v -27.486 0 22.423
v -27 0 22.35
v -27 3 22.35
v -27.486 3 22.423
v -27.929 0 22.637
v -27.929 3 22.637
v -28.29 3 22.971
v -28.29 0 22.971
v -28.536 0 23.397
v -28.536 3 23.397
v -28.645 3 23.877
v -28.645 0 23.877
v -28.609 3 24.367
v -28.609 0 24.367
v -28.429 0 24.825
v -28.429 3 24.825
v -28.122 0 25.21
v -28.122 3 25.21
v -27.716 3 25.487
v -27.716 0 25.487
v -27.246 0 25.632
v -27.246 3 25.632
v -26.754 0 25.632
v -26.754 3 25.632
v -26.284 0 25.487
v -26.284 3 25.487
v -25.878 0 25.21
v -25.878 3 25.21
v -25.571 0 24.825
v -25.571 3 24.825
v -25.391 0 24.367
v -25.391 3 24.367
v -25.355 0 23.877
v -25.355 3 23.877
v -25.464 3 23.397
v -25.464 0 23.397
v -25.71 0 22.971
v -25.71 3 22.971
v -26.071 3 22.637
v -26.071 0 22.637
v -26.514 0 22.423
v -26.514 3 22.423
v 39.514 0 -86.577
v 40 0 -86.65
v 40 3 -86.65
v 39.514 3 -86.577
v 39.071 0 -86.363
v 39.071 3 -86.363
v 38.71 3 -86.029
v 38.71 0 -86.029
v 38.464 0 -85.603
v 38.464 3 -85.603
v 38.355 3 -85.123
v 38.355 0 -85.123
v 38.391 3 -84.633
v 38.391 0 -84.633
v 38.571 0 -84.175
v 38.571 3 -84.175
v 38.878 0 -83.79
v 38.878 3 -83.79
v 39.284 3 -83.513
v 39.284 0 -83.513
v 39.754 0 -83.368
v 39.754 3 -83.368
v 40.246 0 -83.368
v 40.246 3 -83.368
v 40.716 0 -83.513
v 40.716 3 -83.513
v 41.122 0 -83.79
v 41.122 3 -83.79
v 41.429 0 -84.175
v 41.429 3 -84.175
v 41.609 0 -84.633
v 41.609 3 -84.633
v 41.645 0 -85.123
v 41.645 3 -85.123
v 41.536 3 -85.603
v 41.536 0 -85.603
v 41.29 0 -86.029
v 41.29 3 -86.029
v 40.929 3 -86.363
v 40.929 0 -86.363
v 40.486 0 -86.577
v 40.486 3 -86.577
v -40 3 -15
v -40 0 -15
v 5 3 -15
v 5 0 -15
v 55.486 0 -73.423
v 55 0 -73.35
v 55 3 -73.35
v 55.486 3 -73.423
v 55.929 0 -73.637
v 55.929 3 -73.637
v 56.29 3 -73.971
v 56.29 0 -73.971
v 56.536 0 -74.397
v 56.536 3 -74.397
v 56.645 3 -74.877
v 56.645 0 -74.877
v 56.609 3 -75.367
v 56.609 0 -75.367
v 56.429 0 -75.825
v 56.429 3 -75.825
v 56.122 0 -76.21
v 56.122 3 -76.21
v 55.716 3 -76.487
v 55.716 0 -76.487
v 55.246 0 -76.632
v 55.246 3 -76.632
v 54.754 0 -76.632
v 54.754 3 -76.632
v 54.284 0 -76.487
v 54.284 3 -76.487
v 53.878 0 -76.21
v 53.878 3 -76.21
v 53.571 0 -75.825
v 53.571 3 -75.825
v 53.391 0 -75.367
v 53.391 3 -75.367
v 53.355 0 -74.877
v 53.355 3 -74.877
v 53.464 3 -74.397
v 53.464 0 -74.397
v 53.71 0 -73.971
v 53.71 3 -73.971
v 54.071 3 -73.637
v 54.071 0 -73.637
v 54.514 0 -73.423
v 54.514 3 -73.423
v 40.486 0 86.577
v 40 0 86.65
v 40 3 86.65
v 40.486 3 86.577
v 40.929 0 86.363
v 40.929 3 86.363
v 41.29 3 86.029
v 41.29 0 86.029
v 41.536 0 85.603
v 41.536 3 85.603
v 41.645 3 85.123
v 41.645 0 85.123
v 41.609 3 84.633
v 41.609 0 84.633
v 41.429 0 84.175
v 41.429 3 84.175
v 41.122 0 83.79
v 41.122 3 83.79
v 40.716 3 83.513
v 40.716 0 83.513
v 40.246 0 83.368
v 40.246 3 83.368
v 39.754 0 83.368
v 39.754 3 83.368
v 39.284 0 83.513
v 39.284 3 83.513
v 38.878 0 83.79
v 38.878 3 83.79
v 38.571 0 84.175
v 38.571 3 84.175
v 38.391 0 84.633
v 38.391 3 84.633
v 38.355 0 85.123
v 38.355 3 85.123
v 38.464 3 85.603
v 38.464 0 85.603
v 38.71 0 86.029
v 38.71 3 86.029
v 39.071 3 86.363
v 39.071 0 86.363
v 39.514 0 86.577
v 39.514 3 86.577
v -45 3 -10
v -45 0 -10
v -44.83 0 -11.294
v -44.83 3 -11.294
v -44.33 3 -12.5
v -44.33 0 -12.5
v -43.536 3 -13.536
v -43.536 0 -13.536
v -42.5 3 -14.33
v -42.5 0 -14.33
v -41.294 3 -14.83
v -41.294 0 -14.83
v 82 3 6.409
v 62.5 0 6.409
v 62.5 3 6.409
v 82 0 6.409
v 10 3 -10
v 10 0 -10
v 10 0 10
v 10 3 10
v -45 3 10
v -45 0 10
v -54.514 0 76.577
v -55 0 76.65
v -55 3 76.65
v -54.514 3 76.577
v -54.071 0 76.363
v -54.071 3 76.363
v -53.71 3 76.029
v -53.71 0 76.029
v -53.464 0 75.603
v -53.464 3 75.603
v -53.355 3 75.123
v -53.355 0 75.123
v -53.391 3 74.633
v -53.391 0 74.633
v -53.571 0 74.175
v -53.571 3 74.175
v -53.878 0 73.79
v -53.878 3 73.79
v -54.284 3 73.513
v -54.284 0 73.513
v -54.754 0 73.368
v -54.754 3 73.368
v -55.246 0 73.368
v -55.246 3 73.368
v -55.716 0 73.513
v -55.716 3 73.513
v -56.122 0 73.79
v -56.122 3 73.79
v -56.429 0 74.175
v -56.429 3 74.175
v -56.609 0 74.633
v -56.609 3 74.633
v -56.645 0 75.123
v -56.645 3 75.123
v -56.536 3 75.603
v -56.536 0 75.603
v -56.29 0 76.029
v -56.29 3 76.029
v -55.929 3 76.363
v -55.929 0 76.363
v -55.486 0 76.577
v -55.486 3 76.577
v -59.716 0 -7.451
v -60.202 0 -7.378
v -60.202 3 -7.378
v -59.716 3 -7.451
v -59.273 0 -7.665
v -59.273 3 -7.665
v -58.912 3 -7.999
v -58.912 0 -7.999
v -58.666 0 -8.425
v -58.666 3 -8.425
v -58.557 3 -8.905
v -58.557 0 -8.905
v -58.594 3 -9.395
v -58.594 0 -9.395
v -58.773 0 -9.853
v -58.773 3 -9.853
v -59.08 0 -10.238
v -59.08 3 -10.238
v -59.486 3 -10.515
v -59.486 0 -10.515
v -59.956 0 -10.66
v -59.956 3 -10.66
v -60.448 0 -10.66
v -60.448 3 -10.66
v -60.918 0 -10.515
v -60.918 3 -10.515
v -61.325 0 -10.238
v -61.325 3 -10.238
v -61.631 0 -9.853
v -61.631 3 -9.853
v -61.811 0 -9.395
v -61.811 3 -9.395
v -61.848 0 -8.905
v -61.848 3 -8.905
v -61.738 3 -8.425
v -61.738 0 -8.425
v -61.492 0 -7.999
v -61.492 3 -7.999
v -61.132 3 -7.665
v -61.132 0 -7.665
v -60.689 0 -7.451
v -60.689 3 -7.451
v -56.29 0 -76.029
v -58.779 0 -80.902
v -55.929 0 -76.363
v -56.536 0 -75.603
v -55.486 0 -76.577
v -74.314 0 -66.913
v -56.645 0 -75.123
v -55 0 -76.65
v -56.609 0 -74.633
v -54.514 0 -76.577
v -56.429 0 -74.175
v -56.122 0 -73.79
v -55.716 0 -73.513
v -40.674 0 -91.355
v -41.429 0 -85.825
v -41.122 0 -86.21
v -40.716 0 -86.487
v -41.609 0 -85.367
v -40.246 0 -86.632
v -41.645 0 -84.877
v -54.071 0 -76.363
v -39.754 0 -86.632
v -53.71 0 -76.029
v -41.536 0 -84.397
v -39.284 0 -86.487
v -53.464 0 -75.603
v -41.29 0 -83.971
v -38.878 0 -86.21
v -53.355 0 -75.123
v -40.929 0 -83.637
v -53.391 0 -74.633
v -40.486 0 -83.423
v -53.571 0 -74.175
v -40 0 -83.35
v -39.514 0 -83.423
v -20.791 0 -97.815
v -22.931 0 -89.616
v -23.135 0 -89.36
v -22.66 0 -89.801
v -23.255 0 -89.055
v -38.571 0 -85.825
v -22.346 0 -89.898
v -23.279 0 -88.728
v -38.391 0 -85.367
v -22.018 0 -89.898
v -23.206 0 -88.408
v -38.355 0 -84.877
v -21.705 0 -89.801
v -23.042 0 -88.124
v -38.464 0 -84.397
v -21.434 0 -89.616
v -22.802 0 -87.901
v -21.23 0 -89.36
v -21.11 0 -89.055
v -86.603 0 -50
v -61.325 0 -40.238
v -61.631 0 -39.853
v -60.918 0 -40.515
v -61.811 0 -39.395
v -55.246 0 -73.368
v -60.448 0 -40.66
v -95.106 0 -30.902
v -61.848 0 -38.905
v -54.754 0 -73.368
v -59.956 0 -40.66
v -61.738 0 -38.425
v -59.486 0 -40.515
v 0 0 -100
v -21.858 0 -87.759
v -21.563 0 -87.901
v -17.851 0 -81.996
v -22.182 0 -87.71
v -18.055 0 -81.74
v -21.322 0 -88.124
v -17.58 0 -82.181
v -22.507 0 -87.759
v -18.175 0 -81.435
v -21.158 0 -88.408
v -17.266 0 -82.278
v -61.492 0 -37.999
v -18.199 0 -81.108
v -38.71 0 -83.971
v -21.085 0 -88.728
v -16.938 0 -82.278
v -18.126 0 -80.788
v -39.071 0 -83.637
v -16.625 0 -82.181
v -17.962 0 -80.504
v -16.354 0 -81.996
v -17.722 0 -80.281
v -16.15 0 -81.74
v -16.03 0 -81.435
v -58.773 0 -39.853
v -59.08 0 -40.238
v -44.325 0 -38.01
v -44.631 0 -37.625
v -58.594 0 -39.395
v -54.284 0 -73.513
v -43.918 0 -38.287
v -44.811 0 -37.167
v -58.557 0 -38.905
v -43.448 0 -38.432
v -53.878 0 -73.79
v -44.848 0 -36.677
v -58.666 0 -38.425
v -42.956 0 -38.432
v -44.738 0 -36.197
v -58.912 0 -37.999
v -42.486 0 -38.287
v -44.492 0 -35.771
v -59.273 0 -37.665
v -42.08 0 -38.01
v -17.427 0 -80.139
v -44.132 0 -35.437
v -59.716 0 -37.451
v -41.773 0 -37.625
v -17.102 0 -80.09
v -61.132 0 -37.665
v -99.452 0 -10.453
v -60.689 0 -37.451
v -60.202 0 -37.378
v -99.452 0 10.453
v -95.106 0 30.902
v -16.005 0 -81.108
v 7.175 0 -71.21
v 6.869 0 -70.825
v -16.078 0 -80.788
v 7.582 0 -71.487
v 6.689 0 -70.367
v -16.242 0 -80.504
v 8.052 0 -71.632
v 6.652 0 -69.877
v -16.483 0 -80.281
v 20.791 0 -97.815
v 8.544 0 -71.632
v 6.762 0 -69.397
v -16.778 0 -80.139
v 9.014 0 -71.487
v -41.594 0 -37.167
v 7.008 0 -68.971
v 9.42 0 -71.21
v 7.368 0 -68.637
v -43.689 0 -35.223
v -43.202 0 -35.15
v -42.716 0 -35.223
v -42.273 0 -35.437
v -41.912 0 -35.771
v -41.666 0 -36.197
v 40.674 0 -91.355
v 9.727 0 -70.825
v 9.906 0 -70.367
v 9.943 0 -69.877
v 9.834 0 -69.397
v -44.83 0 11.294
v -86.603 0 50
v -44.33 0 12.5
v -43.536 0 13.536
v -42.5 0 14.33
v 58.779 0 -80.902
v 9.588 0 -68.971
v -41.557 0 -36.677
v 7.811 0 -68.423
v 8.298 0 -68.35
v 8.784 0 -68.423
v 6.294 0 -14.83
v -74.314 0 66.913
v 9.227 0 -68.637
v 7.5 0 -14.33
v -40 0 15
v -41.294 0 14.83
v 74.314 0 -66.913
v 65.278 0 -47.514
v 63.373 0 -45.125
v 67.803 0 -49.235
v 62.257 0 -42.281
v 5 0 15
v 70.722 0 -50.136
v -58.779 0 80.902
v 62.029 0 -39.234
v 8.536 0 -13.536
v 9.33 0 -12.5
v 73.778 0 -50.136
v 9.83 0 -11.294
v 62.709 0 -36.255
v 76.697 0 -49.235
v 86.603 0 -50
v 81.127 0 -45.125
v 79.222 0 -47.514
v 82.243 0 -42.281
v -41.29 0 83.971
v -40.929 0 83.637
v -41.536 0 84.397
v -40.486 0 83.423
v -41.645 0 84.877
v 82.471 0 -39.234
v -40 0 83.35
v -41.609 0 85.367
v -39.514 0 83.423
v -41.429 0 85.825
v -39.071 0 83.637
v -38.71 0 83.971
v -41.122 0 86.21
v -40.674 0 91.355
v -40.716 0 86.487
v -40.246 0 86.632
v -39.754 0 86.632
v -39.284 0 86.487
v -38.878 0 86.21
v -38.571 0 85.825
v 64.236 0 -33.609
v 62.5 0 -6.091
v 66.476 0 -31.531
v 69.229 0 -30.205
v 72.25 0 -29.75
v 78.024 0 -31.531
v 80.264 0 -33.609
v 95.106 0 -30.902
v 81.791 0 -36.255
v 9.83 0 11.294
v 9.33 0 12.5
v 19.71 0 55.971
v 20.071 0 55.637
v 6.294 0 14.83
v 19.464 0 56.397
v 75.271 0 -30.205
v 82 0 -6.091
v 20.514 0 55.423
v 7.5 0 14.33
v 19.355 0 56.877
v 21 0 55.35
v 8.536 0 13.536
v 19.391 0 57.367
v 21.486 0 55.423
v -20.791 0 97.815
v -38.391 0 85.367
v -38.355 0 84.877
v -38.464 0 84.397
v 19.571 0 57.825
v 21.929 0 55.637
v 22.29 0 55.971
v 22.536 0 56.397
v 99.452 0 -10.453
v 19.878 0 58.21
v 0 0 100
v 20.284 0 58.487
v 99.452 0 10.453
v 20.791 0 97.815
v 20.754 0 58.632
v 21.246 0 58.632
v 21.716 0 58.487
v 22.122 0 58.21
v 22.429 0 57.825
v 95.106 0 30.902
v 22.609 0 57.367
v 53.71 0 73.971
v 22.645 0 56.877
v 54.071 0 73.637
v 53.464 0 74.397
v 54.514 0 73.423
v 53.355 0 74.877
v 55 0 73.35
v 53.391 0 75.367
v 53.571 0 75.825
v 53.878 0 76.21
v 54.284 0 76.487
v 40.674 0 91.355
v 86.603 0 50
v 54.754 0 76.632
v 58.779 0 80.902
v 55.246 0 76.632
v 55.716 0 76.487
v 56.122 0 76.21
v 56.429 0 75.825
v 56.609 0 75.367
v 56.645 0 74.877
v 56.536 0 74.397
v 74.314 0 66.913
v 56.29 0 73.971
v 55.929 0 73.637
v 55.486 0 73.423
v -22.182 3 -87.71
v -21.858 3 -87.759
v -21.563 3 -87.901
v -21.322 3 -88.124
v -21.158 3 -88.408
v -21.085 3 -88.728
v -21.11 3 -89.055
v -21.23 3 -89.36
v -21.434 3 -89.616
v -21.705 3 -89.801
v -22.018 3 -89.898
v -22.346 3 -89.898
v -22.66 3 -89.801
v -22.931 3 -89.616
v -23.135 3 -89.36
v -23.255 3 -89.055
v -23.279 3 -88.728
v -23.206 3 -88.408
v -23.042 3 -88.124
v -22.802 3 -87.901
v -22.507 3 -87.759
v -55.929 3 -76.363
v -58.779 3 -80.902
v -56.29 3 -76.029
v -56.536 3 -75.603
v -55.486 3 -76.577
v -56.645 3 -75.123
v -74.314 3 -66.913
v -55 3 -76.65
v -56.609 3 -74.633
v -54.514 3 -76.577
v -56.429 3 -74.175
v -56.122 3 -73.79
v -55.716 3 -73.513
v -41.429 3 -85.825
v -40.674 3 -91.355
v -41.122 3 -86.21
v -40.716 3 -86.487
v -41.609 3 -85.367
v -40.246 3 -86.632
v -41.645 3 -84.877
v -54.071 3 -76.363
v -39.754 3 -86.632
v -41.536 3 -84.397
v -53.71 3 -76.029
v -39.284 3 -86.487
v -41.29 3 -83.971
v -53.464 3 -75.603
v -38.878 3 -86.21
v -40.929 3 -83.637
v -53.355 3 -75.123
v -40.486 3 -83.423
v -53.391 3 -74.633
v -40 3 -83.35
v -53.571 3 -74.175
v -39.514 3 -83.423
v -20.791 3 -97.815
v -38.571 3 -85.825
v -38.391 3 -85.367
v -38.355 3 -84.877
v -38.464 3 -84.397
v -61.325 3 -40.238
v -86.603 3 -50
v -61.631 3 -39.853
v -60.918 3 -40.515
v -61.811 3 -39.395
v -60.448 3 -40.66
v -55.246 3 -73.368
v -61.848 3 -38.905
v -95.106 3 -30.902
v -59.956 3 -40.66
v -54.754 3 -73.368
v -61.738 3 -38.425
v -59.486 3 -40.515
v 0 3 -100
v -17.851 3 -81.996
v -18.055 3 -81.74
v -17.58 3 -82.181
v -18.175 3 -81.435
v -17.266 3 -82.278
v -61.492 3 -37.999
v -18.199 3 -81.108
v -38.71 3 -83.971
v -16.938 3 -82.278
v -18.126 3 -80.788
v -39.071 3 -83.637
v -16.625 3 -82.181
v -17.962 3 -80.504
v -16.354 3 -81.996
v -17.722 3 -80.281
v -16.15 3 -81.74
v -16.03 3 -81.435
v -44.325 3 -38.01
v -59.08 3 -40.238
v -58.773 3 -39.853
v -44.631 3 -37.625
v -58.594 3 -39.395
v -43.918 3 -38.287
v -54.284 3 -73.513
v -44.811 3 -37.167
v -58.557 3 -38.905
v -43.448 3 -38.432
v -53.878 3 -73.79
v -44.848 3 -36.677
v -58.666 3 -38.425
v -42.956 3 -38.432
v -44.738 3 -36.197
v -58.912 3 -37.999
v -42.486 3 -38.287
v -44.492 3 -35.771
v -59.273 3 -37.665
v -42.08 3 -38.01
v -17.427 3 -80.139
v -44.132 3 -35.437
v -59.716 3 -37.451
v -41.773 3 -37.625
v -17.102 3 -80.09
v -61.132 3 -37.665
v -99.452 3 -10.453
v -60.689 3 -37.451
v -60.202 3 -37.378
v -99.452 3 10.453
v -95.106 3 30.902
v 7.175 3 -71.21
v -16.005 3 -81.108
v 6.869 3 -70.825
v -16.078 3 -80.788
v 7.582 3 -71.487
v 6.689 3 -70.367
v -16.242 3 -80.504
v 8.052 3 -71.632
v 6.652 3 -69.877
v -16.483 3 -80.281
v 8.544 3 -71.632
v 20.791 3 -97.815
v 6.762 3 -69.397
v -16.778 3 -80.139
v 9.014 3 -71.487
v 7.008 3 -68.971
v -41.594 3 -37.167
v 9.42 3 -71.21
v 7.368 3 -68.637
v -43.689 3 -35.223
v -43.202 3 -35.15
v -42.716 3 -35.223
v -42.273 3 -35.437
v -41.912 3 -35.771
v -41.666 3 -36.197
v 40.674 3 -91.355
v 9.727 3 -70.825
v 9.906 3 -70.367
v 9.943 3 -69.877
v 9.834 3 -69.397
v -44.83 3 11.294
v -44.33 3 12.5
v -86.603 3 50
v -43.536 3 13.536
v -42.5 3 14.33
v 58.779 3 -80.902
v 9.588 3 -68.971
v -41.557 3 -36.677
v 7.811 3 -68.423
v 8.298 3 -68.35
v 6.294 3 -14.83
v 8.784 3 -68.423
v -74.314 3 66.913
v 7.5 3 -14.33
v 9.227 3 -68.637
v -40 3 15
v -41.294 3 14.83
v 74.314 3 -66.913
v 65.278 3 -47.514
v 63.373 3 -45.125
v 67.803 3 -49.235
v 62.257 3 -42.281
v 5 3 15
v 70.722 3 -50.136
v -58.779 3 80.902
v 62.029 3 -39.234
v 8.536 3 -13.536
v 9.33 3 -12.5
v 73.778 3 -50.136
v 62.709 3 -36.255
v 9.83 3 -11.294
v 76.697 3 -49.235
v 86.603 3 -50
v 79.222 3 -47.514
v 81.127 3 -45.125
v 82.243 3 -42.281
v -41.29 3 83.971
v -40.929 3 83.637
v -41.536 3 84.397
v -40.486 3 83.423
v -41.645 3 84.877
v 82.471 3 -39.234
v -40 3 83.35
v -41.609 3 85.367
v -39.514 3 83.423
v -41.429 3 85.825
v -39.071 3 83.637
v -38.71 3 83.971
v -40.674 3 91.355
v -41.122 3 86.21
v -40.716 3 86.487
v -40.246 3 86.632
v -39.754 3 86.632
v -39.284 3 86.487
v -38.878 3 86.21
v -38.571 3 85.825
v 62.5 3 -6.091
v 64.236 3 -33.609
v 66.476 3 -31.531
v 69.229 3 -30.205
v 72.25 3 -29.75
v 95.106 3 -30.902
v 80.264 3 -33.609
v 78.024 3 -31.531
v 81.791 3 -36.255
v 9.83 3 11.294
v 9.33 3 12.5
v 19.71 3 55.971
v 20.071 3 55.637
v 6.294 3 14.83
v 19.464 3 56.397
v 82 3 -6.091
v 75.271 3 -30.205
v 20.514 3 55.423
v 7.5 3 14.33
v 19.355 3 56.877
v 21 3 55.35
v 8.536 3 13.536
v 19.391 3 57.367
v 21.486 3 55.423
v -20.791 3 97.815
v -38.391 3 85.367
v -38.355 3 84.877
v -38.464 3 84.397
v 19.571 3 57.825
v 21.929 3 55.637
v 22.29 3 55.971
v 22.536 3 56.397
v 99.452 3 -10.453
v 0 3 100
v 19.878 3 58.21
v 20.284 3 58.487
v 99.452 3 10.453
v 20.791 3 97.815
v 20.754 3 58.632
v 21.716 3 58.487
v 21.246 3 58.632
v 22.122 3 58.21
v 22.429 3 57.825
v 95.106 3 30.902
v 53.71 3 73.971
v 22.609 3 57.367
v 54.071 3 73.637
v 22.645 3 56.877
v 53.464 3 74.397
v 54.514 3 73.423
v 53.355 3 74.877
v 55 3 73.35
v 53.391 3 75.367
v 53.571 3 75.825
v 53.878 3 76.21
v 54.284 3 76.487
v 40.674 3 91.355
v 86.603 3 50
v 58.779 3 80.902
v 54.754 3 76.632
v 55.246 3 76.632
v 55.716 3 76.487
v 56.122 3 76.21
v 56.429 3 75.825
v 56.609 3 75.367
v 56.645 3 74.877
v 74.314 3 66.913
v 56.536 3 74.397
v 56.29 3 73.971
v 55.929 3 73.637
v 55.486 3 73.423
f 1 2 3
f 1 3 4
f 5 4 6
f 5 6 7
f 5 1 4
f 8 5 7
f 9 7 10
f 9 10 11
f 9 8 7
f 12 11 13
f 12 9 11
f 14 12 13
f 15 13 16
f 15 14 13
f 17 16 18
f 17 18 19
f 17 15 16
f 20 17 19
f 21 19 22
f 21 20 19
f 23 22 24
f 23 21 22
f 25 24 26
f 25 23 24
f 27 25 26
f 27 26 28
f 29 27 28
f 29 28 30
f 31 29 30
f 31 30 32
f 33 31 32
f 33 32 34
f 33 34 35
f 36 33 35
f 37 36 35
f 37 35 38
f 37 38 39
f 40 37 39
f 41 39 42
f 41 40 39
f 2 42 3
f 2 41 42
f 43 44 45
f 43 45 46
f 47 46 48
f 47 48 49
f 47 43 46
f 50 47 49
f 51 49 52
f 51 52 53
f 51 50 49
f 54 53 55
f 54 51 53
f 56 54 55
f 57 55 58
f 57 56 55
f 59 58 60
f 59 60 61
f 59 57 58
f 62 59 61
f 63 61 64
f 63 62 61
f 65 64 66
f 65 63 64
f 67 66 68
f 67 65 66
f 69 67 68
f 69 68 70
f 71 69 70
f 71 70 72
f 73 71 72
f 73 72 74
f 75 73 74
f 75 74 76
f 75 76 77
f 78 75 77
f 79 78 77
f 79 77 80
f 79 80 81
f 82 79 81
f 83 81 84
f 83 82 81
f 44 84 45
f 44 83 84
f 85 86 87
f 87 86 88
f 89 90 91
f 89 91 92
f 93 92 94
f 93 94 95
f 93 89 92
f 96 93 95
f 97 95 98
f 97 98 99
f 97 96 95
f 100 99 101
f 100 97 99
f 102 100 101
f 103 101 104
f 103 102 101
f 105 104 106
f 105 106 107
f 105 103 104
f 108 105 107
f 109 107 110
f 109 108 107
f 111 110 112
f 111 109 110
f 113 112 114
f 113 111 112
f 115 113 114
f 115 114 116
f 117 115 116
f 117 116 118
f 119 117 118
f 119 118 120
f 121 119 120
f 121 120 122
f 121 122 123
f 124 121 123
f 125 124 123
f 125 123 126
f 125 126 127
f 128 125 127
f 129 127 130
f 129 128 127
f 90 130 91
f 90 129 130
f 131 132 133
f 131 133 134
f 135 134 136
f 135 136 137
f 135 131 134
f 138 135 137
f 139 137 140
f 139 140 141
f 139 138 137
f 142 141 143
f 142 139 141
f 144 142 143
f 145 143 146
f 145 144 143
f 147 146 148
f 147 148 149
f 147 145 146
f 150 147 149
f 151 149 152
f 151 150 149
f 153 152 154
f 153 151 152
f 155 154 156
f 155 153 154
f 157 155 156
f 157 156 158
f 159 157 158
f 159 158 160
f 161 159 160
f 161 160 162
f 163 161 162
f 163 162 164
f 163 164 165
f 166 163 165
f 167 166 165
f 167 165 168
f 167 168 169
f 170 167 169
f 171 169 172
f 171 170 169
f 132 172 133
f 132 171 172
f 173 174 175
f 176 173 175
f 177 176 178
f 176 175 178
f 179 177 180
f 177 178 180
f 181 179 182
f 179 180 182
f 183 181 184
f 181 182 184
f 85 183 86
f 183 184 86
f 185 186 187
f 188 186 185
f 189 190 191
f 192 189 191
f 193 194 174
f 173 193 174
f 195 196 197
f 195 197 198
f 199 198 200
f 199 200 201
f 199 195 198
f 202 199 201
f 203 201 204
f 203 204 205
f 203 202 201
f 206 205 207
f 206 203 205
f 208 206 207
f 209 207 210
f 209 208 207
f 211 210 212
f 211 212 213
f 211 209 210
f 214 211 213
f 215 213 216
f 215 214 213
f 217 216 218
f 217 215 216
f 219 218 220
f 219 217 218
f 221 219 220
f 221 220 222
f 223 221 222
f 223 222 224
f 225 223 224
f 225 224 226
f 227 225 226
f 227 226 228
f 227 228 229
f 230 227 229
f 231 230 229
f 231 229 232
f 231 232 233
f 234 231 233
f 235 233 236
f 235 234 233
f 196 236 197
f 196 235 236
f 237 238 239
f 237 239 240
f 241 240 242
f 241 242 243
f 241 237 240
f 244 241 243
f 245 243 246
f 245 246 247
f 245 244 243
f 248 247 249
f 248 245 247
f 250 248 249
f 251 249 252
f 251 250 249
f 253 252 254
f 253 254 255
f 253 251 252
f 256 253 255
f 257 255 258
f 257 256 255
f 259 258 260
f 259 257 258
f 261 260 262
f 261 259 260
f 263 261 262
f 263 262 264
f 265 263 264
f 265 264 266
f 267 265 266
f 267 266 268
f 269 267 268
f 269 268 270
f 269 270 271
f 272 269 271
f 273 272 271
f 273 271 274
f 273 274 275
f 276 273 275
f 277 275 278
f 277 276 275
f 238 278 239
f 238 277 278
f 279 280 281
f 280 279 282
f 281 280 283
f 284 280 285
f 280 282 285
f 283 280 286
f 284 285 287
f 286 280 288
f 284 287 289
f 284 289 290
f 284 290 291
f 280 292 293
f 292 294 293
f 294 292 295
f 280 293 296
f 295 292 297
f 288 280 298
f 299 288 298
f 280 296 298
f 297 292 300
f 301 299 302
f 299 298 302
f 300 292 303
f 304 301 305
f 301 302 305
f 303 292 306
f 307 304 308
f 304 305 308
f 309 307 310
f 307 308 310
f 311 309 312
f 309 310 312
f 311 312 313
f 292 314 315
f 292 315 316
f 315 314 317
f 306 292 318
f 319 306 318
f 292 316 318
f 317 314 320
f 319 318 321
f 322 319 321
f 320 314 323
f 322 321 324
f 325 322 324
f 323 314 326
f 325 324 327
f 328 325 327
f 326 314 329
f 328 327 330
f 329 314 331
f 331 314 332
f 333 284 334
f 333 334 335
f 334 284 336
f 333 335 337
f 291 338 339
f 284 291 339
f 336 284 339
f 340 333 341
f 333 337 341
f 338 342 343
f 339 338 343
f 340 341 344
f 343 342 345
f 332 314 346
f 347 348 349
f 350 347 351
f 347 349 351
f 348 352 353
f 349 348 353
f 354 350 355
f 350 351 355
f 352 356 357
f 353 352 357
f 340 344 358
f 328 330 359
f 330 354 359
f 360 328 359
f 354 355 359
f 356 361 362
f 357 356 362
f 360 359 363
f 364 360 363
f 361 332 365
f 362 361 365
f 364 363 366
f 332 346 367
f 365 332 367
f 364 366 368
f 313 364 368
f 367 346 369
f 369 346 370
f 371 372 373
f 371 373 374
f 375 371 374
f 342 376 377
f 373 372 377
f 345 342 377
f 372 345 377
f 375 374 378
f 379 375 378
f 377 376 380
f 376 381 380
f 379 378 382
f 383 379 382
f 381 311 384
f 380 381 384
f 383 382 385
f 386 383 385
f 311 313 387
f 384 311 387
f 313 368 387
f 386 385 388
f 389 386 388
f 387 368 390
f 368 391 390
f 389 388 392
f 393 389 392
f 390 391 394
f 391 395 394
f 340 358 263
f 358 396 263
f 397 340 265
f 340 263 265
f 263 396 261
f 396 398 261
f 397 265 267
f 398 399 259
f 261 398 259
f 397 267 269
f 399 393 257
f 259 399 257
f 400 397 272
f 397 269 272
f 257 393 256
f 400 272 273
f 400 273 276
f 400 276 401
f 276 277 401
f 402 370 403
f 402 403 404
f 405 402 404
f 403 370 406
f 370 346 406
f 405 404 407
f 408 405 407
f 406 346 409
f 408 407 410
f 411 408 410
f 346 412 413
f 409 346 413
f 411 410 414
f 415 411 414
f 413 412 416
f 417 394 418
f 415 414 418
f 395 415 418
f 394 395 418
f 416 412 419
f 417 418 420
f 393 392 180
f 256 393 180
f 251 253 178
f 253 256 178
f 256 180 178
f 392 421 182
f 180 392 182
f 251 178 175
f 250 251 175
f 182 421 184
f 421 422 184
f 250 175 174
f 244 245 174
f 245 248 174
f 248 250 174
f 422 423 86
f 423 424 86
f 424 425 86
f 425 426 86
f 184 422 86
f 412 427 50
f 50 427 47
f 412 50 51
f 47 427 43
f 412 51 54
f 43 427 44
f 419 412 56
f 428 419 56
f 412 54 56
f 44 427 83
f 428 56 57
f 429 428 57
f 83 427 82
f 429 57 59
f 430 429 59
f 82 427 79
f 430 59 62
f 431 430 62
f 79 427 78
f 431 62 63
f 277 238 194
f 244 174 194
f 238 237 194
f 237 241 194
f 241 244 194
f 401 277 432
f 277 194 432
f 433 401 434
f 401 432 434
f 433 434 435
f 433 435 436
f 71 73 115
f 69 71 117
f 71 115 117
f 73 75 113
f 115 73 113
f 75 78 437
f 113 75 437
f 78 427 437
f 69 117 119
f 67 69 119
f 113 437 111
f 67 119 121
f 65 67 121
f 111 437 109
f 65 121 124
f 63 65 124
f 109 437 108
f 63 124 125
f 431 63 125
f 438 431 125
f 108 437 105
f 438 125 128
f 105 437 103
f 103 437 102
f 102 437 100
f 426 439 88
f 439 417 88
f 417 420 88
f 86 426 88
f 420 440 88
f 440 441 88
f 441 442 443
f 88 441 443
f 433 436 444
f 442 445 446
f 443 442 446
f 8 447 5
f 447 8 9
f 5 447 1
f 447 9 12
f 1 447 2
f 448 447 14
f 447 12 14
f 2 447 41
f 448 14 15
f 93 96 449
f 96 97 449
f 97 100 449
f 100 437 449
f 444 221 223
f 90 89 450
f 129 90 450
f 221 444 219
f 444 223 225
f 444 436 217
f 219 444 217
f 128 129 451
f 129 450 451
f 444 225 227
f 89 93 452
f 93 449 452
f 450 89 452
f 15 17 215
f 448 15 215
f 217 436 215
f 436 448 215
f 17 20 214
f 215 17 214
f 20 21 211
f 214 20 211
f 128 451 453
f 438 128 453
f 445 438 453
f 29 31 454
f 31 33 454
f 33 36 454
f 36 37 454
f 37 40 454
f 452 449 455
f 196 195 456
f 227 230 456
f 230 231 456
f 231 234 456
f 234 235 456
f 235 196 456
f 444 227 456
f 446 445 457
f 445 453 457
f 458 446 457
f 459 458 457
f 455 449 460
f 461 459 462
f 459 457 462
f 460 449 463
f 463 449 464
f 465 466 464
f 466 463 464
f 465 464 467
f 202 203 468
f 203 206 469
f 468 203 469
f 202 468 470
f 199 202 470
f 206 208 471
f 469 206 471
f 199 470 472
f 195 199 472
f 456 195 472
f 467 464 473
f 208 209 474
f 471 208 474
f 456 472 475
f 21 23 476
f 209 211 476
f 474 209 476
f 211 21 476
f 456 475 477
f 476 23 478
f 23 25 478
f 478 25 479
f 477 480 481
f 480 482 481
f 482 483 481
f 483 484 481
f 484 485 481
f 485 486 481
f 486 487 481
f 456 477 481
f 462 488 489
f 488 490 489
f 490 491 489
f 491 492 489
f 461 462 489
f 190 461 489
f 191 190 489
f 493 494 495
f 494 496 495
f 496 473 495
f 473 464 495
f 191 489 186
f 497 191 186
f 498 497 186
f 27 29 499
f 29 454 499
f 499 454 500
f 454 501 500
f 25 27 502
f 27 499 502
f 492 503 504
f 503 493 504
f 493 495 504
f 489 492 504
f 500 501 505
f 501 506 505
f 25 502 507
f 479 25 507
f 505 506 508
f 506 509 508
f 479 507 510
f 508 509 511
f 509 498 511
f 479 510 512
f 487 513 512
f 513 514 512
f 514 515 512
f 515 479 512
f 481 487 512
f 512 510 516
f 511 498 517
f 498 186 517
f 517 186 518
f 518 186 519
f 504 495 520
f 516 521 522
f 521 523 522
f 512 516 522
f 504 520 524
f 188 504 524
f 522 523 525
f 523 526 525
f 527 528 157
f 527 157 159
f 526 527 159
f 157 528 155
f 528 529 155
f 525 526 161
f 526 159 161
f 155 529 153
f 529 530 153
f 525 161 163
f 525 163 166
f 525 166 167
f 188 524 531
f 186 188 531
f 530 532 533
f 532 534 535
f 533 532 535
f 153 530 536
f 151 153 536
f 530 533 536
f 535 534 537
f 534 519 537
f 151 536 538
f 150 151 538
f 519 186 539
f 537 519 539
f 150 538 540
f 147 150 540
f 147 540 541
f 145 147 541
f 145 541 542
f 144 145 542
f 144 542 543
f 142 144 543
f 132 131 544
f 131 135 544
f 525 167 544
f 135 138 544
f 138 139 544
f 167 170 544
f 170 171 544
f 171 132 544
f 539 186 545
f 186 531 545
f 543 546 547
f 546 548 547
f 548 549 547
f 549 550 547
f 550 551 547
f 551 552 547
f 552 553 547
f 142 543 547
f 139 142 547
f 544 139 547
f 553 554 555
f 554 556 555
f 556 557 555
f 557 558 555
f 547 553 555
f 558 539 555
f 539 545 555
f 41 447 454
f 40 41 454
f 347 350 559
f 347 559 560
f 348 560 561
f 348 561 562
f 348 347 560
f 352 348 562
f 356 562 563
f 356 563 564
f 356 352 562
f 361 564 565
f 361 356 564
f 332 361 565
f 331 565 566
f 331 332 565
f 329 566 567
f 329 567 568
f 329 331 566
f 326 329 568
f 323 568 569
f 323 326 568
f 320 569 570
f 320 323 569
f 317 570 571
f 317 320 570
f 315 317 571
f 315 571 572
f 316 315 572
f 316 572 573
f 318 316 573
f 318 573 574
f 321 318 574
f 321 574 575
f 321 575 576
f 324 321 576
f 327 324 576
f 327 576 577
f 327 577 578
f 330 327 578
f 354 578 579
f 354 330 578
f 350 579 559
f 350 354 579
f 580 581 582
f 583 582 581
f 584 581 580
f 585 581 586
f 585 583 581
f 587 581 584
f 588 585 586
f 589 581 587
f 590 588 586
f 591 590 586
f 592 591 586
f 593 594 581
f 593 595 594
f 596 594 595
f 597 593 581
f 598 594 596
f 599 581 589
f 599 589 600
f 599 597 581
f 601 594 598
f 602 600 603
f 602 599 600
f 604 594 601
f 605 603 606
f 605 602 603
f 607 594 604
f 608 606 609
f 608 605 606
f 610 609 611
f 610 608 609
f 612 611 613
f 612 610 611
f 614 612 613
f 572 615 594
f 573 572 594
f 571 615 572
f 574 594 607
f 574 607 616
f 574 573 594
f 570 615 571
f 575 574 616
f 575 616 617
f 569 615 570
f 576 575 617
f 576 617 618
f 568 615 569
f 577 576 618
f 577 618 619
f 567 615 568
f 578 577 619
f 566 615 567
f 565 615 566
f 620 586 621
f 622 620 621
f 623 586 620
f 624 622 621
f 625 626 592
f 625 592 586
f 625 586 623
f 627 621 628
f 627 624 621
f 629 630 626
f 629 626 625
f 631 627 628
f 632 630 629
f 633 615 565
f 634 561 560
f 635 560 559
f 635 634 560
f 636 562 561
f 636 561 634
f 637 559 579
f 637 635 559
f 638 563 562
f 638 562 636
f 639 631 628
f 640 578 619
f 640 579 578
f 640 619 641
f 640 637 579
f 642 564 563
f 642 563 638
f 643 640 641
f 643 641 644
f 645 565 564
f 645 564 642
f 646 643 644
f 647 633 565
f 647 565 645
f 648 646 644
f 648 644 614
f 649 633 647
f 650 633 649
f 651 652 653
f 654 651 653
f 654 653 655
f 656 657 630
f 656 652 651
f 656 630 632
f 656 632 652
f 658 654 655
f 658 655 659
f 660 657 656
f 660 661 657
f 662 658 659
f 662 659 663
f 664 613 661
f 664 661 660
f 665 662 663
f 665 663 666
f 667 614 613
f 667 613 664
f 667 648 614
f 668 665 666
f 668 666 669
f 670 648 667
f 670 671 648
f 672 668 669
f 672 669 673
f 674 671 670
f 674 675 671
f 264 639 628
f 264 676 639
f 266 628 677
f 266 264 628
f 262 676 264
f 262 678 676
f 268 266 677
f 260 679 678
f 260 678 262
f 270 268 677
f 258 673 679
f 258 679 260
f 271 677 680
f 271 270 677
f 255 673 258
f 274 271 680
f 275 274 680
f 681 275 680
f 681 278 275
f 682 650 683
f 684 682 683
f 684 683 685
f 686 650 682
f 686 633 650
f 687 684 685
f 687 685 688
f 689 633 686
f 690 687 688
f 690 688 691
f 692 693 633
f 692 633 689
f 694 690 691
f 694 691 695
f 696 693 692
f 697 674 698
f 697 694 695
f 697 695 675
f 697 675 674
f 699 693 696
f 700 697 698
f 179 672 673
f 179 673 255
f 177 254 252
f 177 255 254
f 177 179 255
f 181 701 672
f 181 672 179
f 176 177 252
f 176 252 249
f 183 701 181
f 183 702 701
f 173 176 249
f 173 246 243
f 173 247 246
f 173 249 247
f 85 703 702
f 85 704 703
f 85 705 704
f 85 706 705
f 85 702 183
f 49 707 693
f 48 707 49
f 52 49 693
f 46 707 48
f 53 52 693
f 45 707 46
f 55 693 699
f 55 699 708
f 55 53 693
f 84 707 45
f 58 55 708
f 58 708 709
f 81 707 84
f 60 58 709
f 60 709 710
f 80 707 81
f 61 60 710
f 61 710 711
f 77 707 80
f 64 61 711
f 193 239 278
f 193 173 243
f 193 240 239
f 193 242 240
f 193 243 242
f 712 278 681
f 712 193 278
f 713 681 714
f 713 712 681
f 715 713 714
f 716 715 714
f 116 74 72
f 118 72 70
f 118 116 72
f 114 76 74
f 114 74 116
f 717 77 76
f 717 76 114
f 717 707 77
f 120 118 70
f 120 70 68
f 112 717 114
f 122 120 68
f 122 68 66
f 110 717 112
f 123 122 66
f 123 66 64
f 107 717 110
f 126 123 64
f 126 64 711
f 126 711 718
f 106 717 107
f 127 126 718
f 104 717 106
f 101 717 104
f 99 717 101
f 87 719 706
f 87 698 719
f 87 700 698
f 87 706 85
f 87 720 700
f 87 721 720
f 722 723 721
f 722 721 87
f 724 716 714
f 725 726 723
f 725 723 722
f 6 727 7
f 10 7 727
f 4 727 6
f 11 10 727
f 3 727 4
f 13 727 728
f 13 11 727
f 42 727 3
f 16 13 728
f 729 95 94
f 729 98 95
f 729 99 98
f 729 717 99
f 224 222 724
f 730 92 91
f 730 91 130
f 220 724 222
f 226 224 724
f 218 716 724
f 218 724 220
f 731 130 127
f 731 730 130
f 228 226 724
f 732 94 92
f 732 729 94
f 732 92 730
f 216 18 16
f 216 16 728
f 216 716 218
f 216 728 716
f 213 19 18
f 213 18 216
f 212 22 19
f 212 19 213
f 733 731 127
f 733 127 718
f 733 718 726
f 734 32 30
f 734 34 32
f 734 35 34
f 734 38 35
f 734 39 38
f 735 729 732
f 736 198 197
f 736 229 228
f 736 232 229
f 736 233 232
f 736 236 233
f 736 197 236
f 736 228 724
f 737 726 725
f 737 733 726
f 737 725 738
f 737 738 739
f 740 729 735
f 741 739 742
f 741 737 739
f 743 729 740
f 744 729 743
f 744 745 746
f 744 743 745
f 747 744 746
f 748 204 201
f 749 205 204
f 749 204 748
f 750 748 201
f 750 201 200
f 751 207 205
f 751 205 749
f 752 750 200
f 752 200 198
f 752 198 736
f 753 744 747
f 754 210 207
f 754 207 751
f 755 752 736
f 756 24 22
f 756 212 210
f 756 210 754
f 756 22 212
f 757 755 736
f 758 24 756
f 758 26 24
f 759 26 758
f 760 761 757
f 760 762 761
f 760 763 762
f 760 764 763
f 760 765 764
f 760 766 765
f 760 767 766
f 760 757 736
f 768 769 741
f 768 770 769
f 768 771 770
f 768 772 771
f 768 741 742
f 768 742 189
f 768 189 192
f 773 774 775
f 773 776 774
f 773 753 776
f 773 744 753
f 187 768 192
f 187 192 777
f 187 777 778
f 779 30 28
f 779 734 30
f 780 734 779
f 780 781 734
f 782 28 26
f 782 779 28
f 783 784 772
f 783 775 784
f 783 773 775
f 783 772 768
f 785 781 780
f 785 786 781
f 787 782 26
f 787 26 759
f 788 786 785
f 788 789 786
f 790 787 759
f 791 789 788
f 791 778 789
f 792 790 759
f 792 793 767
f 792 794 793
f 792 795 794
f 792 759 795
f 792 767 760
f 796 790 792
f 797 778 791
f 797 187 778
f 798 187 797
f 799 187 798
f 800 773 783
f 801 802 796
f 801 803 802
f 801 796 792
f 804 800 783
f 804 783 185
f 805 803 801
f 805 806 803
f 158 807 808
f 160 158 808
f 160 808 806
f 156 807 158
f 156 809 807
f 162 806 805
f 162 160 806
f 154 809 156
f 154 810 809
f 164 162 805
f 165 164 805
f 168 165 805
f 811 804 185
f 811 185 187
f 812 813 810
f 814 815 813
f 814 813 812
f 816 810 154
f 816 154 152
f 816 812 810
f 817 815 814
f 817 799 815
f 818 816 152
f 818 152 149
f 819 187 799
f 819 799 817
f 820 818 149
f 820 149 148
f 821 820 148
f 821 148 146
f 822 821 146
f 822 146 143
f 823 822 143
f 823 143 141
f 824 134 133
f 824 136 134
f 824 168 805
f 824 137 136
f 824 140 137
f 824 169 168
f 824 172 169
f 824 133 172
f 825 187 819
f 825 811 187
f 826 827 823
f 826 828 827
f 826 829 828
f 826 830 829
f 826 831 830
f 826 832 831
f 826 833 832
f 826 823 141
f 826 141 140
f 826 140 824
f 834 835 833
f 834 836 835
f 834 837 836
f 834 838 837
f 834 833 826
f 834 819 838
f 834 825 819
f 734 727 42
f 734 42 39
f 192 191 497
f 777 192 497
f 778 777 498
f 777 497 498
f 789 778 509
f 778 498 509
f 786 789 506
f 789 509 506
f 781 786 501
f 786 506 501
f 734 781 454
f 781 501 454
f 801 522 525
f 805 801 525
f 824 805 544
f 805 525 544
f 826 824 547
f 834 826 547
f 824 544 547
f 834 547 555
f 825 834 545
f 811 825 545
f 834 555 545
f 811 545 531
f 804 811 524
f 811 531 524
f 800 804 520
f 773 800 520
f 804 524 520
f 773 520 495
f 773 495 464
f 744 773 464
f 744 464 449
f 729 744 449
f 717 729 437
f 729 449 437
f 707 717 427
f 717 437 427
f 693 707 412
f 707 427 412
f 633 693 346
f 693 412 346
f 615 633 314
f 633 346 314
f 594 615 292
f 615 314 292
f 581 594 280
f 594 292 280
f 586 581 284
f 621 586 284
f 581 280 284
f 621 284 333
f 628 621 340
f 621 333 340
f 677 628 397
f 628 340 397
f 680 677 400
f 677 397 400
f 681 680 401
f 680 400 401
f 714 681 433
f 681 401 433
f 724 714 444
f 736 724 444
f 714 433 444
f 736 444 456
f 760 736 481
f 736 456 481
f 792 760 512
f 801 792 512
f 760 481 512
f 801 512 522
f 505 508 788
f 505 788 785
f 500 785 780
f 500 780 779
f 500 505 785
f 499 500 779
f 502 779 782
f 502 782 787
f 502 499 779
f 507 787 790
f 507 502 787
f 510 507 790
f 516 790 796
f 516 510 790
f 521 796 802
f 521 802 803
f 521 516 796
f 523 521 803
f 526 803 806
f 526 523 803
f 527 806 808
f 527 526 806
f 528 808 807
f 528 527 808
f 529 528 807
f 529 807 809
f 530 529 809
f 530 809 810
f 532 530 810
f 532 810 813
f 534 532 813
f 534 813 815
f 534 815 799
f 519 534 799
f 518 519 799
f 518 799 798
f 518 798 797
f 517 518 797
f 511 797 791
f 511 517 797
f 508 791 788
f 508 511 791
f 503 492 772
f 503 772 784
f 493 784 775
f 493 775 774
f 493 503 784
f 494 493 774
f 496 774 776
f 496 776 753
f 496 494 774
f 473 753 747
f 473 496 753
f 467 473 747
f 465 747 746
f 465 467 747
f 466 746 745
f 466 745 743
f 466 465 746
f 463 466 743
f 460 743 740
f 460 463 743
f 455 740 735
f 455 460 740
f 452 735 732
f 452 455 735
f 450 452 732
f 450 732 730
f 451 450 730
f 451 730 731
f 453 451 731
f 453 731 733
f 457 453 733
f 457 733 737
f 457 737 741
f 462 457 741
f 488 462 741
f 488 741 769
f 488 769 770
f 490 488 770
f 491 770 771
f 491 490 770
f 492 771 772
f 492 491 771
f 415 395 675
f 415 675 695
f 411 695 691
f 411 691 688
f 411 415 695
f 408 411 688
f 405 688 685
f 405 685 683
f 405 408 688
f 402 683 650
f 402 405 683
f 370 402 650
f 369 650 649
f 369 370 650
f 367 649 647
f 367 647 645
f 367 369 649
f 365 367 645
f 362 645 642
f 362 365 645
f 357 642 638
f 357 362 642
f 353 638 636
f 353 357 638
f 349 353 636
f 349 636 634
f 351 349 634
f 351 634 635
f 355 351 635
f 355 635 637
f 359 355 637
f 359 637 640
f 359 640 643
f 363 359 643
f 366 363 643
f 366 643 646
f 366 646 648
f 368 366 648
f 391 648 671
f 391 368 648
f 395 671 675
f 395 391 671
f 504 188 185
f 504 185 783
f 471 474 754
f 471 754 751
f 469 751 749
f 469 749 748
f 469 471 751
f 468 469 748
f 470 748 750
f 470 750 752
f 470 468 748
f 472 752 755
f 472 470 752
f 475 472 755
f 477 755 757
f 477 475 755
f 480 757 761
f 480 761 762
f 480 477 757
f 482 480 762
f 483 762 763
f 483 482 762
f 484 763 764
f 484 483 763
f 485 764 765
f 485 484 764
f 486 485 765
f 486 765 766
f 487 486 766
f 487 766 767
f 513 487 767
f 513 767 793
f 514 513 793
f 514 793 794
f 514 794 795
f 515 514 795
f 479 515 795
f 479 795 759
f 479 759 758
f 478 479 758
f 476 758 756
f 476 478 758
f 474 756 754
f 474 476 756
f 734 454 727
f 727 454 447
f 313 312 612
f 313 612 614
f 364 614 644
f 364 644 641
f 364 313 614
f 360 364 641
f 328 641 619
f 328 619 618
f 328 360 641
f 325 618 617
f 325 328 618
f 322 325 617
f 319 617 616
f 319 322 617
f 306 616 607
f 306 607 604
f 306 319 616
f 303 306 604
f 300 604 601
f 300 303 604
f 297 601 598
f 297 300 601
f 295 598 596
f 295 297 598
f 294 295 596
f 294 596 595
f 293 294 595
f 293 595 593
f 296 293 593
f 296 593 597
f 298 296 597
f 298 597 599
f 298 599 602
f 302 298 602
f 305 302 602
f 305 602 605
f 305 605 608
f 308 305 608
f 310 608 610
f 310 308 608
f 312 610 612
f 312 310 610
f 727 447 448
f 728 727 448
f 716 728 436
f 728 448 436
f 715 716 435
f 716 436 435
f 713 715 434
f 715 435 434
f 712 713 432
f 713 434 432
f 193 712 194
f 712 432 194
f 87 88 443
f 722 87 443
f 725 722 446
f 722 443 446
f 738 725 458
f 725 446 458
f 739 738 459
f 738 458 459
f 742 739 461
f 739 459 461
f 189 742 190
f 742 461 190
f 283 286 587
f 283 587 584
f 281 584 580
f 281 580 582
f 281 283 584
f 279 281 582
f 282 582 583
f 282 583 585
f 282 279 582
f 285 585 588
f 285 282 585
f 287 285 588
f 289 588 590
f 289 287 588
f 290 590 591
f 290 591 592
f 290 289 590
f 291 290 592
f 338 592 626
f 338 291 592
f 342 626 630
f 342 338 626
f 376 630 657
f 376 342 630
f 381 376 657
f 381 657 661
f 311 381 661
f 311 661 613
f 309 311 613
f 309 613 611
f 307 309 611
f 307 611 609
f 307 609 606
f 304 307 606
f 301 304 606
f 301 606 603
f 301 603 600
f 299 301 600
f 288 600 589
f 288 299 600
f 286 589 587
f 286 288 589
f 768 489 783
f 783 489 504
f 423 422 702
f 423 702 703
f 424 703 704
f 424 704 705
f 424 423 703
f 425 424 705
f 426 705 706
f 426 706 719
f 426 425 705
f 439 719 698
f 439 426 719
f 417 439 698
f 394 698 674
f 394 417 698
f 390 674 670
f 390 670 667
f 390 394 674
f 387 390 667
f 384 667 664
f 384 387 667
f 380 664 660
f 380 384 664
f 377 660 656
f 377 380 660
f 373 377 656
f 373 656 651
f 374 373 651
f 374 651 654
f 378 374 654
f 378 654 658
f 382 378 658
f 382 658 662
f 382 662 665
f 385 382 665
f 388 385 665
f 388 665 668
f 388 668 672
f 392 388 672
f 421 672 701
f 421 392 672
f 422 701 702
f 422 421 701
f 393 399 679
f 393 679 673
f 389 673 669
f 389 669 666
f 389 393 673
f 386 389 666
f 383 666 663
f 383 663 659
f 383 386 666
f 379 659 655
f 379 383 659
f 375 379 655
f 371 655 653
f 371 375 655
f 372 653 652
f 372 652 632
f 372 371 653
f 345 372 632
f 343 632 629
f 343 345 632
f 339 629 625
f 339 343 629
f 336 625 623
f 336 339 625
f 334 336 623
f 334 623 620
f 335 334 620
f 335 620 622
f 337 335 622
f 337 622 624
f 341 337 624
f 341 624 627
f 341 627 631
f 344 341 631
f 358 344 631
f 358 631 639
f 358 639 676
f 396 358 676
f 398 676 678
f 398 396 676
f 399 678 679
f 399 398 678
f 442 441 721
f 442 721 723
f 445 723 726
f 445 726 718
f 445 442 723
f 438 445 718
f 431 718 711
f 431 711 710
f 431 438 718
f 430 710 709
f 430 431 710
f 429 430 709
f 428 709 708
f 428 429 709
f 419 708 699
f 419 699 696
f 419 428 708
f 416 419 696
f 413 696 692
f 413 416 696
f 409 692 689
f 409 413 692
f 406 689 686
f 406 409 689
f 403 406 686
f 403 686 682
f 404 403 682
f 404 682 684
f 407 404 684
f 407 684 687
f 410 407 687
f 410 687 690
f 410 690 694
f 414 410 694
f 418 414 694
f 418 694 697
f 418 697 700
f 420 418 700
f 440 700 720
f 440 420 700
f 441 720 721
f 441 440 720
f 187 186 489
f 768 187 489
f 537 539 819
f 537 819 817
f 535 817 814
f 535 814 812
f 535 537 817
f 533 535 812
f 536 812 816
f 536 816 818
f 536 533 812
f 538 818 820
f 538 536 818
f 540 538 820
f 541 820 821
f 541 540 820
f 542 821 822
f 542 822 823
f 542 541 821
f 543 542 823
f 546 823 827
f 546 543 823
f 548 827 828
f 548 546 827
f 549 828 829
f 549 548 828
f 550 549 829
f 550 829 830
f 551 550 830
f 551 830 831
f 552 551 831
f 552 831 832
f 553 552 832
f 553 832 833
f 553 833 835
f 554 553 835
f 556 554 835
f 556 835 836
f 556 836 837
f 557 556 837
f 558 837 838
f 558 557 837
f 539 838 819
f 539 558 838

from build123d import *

# Parameters (mm, degrees)
CROQUIS1_R              = 100
CROQUIS1_R_2            = 1.65
CROQUIS1_R_3            = 10.25
CROQUIS1_R_4            = 1.1
CROQUIS1_W              = 19.5
CROQUIS1_H              = 12.5
SALIENTE_EXTRUIR1_DEPTH = 3


with BuildPart() as part:
    # Croquis1 → Saliente-Extruir1 (new body)
    with BuildSketch(Plane(origin=(0, 0, 0), x_dir=(1, 0, 0), z_dir=(0, 1, 0))):
        with Locations(Location((0, 0, 0), (0, 0, 270))):
            Circle(CROQUIS1_R)
        with Locations(Location((55, 75, 0), (0, 0, 270))):
            Circle(CROQUIS1_R_2, mode=Mode.SUBTRACT)
        with Locations(Location((40, -85, 0), (0, 0, 270))):
            Circle(CROQUIS1_R_2, mode=Mode.SUBTRACT)
        with Locations(Location((40, 85, 0), (0, 0, 90))):
            Circle(CROQUIS1_R_2, mode=Mode.SUBTRACT)
        with Locations(Location((-60.20239259, 39.027979594, 0), (0, 0, 270))):
            Circle(CROQUIS1_R_2, mode=Mode.SUBTRACT)
        with Locations(Location((-40, -85, 0), (0, 0, 90))):
            Circle(CROQUIS1_R_2, mode=Mode.SUBTRACT)
        with Locations(Location((-55, -75, 0), (0, 0, 270))):
            Circle(CROQUIS1_R_2, mode=Mode.SUBTRACT)
        with Locations(Location((-55, 75, 0), (0, 0, 90))):
            Circle(CROQUIS1_R_2, mode=Mode.SUBTRACT)
        with Locations(Location((-40, 85, 0), (0, 0, 270))):
            Circle(CROQUIS1_R_2, mode=Mode.SUBTRACT)
        with Locations(Location((-60.20239259, 9.027979594, 0), (0, 0, 270))):
            Circle(CROQUIS1_R_2, mode=Mode.SUBTRACT)
        with Locations(Location((72.25, 40, 0), (0, 0, 270))):
            Circle(CROQUIS1_R_3, mode=Mode.SUBTRACT)
        with Locations(Location((-43.20239259, 36.8, 0), (0, 0, 270))):
            Circle(CROQUIS1_R_2, mode=Mode.SUBTRACT)
        with Locations(Location((8.29760741, 70, 0), (0, 0, 270))):
            Circle(CROQUIS1_R_2, mode=Mode.SUBTRACT)
        with Locations(Location((21, -57, 0), (0, 0, 90))):
            Circle(CROQUIS1_R_2, mode=Mode.SUBTRACT)
        with Locations(Location((-27, -24, 0), (0, 0, 90))):
            Circle(CROQUIS1_R_2, mode=Mode.SUBTRACT)
        with Locations(Location((55, -75, 0), (0, 0, 90))):
            Circle(CROQUIS1_R_2, mode=Mode.SUBTRACT)
        with Locations(Location((-22.18239259, 88.81, 0), (0, 0, 270))):
            Circle(CROQUIS1_R_4, mode=Mode.SUBTRACT)
        with Locations(Location((-17.10239259, 81.19, 0), (0, 0, 270))):
            Circle(CROQUIS1_R_4, mode=Mode.SUBTRACT)
        with BuildLine():
            Line((-40, 15), (5, 15))
            ThreePointArc((5, 15), (8.535533906, 13.535533906), (10, 10))
            Line((10, 10), (10, -10))
            ThreePointArc((10, -10), (8.535533906, -13.535533906), (5, -15))
            Line((5, -15), (-40, -15))
            ThreePointArc((-40, -15), (-43.535533906, -13.535533906), (-45, -10))
            Line((-45, -10), (-45, 10))
            ThreePointArc((-45, 10), (-43.535533906, 13.535533906), (-40, 15))
        make_face(mode=Mode.SUBTRACT)
        with Locations((72.25, -0.158534098)):
            Rectangle(CROQUIS1_W, CROQUIS1_H, mode=Mode.SUBTRACT)
    extrude(amount=SALIENTE_EXTRUIR1_DEPTH)


solid = part.part
